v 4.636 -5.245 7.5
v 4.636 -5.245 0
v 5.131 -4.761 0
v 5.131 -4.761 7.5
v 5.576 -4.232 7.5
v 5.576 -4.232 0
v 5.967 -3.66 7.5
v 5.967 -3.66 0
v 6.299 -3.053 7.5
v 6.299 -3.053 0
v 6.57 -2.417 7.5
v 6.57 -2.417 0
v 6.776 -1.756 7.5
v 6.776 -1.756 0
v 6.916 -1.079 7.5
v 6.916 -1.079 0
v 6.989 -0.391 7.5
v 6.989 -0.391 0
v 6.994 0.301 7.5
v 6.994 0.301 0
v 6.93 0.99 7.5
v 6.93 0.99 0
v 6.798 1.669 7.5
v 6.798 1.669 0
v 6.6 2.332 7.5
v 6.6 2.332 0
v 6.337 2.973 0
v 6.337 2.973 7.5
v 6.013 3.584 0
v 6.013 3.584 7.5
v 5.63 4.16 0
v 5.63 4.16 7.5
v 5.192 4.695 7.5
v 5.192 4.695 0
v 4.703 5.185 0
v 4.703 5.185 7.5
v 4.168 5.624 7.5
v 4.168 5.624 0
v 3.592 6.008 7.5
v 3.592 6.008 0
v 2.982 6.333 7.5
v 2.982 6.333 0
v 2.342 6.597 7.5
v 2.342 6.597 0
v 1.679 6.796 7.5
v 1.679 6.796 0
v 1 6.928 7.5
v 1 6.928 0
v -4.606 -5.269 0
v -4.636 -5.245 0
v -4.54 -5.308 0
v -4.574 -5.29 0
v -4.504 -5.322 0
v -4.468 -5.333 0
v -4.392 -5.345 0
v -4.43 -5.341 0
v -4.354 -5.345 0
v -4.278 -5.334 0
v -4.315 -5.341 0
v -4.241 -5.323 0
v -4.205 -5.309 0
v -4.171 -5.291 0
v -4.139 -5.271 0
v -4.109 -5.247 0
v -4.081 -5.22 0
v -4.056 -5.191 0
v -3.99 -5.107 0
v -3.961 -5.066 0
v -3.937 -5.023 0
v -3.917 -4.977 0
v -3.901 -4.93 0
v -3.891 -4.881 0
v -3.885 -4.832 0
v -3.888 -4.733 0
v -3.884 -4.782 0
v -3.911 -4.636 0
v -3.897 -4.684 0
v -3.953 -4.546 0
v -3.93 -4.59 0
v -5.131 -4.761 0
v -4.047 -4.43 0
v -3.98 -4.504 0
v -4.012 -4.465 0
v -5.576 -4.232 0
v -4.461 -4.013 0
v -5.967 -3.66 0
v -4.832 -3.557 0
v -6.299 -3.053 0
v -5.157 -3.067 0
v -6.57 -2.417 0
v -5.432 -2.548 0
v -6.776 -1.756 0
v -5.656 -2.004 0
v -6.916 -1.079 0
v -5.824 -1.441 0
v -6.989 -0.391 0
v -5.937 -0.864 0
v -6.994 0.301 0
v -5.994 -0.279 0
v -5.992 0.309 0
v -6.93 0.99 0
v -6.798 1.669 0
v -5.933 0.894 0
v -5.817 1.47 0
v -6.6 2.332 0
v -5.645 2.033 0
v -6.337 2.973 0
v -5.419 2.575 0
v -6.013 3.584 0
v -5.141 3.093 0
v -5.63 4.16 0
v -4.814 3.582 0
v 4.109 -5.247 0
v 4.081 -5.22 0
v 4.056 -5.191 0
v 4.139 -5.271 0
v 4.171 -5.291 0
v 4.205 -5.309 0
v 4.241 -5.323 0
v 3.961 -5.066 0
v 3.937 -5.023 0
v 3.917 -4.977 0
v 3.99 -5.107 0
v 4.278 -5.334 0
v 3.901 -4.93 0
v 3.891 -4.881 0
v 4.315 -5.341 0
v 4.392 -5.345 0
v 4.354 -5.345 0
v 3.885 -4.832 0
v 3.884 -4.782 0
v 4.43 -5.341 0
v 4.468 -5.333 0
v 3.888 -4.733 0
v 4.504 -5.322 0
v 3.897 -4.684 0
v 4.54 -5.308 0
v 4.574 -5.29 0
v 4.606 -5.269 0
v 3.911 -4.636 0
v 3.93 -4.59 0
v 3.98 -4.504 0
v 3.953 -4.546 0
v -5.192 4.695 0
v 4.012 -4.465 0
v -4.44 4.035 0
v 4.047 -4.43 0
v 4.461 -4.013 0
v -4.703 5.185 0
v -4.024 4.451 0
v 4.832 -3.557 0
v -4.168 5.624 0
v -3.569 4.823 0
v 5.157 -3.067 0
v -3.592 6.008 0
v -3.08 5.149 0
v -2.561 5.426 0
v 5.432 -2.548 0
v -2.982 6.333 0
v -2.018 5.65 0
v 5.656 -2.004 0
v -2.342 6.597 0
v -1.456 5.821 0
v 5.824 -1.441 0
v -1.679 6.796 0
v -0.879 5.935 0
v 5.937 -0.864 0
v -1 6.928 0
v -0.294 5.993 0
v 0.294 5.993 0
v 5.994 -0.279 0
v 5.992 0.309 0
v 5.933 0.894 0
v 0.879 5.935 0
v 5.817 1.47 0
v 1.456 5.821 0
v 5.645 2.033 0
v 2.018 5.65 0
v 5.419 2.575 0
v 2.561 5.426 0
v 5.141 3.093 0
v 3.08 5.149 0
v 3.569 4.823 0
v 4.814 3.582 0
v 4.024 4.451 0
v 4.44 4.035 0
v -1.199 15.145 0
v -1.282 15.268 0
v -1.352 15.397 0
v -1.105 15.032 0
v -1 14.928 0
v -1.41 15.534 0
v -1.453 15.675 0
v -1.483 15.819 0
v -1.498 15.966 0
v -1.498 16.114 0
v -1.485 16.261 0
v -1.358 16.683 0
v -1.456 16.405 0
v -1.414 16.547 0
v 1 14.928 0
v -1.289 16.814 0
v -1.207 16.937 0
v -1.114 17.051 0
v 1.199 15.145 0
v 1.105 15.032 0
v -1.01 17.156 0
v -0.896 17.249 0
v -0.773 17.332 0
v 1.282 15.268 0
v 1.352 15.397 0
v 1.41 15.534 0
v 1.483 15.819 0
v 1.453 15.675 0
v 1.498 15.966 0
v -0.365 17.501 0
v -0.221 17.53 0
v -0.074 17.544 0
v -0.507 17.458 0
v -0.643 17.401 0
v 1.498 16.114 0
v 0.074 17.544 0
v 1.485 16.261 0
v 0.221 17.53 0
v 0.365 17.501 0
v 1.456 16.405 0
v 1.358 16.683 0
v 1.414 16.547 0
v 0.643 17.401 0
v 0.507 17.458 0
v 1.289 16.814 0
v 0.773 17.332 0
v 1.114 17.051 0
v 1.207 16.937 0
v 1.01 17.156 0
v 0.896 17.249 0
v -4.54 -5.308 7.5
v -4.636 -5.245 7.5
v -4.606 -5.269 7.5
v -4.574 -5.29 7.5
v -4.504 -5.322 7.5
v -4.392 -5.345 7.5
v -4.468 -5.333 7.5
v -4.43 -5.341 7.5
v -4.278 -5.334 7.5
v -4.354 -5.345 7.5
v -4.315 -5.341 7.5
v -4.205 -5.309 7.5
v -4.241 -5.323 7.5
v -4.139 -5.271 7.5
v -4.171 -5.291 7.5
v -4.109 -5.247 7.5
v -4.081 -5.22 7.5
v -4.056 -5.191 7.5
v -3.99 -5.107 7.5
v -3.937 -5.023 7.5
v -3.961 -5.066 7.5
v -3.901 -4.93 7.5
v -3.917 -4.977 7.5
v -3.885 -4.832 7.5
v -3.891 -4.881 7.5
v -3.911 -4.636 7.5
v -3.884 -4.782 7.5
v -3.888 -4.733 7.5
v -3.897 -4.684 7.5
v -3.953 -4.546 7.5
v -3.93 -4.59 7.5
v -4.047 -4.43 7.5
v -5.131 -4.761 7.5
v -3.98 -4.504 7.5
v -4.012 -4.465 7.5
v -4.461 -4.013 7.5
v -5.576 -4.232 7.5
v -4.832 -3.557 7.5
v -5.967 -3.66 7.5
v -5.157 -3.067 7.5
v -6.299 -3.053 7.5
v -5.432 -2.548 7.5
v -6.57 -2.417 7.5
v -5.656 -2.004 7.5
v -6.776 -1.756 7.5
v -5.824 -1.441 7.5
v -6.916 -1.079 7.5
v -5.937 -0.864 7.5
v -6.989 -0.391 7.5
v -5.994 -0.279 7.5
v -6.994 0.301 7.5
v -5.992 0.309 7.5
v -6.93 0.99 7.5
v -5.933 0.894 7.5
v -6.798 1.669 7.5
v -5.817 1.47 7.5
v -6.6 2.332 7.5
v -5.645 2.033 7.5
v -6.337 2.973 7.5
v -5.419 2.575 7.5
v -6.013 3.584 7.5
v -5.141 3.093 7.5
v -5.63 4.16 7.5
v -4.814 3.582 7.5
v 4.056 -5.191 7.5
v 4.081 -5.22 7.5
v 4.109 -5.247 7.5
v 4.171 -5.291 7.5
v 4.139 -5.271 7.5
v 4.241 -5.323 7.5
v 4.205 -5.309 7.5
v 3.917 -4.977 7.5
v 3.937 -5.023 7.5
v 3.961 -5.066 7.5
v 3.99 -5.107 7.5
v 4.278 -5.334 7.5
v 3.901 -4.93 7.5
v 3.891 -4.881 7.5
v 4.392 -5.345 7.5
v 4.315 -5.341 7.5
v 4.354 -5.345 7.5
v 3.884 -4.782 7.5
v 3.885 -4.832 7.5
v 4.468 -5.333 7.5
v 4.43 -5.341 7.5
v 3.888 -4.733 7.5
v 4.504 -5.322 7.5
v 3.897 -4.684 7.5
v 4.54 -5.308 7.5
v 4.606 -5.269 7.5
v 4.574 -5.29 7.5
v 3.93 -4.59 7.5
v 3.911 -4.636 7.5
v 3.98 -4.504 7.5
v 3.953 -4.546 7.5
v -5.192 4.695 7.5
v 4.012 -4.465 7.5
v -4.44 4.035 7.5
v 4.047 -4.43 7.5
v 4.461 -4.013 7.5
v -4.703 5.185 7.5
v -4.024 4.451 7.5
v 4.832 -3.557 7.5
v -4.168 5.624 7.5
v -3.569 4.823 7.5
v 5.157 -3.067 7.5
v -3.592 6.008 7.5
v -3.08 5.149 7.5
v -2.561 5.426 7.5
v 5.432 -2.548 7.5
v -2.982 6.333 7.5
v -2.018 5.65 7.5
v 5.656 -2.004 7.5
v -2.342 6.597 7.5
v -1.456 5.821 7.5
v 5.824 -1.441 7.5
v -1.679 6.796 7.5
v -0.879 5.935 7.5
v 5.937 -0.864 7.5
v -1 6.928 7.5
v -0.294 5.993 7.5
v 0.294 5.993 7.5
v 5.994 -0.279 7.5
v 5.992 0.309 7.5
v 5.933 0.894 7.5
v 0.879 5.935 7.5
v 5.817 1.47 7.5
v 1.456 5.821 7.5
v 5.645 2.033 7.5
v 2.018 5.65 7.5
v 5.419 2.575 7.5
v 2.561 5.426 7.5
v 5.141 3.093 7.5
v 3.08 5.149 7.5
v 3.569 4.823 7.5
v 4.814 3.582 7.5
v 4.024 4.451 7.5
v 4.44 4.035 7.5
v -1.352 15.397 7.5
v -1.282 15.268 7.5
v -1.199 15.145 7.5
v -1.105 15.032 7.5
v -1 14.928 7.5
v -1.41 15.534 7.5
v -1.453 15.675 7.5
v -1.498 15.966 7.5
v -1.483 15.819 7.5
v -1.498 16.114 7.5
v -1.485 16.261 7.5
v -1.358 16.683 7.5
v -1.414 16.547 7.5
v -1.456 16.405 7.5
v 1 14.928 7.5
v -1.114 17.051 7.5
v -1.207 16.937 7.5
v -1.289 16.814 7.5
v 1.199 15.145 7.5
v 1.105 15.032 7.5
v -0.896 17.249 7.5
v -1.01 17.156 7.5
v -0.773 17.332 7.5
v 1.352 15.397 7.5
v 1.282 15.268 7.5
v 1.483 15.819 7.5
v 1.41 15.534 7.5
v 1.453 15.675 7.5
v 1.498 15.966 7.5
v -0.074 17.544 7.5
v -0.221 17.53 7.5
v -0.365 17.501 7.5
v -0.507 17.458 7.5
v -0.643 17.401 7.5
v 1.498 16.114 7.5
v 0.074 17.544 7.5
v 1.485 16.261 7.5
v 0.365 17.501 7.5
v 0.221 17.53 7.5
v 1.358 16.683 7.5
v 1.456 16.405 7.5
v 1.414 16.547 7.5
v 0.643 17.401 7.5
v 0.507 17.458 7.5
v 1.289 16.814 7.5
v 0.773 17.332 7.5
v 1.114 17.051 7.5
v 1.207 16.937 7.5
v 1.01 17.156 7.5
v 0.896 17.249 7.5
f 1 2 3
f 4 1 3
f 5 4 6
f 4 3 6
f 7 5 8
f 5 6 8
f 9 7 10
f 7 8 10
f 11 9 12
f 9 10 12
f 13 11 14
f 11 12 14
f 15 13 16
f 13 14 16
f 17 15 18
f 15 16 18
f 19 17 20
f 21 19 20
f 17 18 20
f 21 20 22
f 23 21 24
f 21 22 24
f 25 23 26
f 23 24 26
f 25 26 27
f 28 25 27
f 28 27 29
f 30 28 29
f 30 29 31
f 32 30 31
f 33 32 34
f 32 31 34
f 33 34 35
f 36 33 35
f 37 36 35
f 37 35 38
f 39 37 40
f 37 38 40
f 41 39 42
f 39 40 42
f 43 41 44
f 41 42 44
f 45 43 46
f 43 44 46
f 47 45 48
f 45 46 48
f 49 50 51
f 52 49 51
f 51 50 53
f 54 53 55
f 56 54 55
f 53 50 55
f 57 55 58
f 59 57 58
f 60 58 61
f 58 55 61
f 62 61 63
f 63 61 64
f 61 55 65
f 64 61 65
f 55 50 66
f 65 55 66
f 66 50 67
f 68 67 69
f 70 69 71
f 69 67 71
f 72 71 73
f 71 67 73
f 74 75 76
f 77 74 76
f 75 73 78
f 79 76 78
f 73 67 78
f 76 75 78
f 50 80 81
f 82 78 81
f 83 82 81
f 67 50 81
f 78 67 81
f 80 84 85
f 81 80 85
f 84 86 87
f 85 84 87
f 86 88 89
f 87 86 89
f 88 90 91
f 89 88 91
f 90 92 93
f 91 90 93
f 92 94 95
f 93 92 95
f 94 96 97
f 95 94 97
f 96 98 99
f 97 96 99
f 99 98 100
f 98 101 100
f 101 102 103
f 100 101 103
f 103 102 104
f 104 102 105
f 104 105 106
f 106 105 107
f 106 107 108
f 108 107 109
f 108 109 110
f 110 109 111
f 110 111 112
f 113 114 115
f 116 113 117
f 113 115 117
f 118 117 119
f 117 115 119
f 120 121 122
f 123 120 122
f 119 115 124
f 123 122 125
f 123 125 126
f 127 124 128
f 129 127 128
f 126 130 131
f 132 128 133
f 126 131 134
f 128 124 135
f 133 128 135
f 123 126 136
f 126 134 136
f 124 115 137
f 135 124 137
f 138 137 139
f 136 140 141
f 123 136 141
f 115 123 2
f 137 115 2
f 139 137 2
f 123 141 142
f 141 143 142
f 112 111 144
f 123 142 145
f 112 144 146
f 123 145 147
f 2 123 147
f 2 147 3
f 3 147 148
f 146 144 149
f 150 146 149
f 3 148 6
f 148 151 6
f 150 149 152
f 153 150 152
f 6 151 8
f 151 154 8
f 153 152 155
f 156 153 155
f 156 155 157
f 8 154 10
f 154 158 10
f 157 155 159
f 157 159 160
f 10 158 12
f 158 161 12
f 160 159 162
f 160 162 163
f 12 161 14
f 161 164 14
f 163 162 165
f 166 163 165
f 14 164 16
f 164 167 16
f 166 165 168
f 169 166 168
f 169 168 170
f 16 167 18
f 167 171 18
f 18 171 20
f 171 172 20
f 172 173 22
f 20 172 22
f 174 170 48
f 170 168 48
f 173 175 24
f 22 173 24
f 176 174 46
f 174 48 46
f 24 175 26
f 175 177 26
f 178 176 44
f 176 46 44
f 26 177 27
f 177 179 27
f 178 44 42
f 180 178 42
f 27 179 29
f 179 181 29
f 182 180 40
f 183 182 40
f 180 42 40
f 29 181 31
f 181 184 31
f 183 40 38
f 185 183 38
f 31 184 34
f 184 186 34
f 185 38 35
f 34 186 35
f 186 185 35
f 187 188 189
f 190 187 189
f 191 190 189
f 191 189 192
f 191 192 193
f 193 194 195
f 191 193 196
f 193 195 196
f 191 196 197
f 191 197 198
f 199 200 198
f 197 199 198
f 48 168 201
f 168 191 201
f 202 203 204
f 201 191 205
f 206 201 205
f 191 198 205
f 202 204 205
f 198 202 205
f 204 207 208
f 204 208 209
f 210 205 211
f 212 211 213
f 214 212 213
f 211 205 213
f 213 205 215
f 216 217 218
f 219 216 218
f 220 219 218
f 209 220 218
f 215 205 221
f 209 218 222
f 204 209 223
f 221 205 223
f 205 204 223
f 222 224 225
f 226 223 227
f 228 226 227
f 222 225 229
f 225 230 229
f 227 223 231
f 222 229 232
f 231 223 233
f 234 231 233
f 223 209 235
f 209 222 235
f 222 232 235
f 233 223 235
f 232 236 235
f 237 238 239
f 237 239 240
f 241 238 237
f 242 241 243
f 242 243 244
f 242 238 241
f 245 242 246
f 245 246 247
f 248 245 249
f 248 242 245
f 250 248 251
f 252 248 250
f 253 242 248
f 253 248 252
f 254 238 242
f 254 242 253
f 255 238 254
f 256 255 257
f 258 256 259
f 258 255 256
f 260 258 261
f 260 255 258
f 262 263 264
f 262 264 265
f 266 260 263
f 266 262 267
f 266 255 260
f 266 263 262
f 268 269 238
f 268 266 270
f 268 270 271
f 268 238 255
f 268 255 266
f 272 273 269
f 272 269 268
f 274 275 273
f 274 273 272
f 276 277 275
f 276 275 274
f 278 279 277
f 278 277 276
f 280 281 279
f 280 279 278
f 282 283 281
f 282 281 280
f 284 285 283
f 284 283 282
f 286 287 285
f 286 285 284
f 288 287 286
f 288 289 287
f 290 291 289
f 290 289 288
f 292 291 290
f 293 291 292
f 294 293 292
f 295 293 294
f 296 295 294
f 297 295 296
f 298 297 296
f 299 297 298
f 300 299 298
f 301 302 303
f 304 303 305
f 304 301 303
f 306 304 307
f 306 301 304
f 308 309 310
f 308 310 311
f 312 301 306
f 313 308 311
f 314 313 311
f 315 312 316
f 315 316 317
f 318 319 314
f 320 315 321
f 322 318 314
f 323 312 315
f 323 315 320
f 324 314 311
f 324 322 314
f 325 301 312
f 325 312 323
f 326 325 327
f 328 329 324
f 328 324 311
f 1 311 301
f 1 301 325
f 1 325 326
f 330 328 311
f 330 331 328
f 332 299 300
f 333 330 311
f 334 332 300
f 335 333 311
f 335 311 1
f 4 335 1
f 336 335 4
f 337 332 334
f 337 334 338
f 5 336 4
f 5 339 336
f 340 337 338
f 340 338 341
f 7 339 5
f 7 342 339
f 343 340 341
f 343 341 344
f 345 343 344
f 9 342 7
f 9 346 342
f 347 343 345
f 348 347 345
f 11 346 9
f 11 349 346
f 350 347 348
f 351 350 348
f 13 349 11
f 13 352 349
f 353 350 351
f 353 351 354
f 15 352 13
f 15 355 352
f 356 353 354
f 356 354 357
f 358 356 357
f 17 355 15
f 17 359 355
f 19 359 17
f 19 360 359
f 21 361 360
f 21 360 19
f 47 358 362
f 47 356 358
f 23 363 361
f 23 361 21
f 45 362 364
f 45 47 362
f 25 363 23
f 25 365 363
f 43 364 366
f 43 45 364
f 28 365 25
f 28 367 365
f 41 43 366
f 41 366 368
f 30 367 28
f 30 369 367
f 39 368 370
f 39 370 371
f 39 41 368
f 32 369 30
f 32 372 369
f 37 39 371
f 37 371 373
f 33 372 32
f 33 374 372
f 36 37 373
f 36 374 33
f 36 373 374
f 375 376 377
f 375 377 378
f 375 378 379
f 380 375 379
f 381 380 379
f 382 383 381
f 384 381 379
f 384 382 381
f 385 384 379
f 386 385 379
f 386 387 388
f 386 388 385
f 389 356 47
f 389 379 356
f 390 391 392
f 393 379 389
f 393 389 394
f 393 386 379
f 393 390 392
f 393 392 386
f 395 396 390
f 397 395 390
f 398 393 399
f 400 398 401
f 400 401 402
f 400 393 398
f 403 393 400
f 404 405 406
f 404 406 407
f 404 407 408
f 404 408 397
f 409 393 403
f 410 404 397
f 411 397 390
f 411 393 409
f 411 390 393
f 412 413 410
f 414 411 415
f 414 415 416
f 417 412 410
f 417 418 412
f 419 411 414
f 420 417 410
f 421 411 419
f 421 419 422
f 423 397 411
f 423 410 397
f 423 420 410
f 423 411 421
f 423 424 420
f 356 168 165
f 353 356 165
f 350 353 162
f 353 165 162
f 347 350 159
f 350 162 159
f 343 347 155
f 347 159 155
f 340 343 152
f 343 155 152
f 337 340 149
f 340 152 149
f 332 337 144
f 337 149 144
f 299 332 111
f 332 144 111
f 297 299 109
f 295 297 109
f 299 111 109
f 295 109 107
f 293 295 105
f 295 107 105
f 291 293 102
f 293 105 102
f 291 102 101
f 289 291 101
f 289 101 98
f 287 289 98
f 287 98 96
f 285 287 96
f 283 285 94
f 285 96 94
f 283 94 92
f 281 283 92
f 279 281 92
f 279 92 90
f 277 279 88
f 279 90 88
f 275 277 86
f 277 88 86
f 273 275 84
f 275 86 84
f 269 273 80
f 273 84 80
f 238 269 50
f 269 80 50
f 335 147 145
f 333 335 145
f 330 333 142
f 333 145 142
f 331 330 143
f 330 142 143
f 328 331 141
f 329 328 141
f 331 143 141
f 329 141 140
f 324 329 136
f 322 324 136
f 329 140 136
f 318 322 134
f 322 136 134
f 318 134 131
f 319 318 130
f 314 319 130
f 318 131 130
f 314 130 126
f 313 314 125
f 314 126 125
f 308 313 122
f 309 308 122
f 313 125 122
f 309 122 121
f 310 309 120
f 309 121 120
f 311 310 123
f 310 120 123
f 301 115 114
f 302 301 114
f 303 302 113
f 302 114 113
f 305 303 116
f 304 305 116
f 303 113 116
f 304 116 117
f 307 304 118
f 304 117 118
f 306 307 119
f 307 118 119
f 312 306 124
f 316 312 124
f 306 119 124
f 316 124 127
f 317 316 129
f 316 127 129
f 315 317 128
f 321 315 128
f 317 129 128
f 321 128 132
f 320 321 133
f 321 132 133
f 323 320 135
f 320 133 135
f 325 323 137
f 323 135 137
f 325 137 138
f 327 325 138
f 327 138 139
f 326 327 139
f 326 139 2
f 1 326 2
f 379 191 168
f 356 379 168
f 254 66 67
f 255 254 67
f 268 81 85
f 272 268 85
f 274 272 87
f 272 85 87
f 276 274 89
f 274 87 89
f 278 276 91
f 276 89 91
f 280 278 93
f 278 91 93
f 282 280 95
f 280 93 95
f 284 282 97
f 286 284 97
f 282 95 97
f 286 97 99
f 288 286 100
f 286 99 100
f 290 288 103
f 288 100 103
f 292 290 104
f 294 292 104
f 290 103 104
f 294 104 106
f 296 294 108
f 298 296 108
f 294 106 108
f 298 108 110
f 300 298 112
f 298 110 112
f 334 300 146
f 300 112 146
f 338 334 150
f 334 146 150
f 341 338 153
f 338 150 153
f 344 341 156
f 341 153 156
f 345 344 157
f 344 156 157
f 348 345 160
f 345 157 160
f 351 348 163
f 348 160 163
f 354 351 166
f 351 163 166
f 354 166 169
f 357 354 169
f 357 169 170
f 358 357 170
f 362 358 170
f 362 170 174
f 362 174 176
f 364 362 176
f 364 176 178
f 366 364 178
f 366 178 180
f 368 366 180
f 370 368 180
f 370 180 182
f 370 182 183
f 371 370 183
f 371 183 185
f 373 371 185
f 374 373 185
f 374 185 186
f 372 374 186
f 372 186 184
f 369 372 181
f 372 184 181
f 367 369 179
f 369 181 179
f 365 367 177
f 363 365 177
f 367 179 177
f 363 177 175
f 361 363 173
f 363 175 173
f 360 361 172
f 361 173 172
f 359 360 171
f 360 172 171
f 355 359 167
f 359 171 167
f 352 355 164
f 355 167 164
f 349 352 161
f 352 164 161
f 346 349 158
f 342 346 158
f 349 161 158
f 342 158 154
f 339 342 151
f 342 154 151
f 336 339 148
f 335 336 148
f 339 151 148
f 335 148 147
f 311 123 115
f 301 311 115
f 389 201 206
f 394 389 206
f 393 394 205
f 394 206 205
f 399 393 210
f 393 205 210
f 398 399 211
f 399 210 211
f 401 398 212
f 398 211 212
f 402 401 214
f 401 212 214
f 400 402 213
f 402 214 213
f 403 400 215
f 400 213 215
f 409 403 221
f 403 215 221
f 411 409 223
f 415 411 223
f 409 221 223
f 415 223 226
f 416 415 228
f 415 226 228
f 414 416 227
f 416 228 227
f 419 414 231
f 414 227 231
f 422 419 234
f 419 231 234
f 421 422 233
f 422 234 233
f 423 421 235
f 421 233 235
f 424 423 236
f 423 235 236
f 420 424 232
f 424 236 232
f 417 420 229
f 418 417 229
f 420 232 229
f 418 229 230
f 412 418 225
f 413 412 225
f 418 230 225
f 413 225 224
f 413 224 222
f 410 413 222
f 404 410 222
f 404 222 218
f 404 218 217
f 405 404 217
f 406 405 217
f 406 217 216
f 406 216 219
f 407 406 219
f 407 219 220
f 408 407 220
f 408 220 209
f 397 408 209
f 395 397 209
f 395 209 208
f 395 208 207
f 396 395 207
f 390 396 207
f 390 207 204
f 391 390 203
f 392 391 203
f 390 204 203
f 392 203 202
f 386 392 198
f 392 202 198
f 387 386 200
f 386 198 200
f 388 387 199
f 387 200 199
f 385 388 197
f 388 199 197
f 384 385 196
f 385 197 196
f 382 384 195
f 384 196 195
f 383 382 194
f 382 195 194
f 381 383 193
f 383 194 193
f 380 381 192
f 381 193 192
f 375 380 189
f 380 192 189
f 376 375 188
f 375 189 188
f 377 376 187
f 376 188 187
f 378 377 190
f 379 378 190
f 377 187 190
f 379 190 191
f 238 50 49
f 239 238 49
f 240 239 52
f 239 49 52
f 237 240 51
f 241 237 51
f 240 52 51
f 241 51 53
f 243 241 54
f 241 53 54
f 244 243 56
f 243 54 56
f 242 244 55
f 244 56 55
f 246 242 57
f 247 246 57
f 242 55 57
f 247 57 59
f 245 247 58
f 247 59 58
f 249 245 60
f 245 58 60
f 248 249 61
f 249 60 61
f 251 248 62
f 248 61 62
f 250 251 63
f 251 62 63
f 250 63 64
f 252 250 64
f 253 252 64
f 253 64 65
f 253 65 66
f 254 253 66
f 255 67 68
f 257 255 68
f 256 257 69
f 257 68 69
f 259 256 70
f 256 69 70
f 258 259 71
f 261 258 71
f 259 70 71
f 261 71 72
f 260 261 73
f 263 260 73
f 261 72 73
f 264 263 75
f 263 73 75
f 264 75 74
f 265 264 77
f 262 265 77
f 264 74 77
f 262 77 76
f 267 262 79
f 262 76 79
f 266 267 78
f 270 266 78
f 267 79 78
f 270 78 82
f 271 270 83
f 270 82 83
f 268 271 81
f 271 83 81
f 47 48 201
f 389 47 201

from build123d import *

# Parameters (mm, degrees)
F1_DEPTH = 7.5


with BuildPart() as f1:
    # F0 (on Top) → F1 (new body)
    with BuildSketch(Plane.XY):
        with BuildLine():
            ThreePointArc((4.055896, -5.191311), (4.334412, -5.34336), (4.636016, -5.244746))
            ThreePointArc((4.636016, -5.244746), (6.707186, 2.003412), (1, 6.928203))
            Line((1, 6.928203), (1, 14.928203))
            ThreePointArc((1, 14.928203), (0, 17.546237), (-1, 14.928203))
            Line((-1, 14.928203), (-1, 6.928203))
            ThreePointArc((-1, 6.928203), (-6.707186, 2.003412), (-4.636016, -5.244746))
            ThreePointArc((-4.636016, -5.244746), (-4.334412, -5.34336), (-4.055896, -5.191311))
            Line((-4.055896, -5.191311), (-3.989942, -5.106893))
            ThreePointArc((-3.989942, -5.106893), (-3.885697, -4.757275), (-4.046721, -4.429904))
            ThreePointArc((-4.046721, -4.429904), (0, 6), (4.046721, -4.429904))
            ThreePointArc((4.046721, -4.429904), (3.885697, -4.757275), (3.989942, -5.106893))
            Line((3.989942, -5.106893), (4.055896, -5.191311))
        make_face()
    extrude(amount=F1_DEPTH)


solid = f1.part
